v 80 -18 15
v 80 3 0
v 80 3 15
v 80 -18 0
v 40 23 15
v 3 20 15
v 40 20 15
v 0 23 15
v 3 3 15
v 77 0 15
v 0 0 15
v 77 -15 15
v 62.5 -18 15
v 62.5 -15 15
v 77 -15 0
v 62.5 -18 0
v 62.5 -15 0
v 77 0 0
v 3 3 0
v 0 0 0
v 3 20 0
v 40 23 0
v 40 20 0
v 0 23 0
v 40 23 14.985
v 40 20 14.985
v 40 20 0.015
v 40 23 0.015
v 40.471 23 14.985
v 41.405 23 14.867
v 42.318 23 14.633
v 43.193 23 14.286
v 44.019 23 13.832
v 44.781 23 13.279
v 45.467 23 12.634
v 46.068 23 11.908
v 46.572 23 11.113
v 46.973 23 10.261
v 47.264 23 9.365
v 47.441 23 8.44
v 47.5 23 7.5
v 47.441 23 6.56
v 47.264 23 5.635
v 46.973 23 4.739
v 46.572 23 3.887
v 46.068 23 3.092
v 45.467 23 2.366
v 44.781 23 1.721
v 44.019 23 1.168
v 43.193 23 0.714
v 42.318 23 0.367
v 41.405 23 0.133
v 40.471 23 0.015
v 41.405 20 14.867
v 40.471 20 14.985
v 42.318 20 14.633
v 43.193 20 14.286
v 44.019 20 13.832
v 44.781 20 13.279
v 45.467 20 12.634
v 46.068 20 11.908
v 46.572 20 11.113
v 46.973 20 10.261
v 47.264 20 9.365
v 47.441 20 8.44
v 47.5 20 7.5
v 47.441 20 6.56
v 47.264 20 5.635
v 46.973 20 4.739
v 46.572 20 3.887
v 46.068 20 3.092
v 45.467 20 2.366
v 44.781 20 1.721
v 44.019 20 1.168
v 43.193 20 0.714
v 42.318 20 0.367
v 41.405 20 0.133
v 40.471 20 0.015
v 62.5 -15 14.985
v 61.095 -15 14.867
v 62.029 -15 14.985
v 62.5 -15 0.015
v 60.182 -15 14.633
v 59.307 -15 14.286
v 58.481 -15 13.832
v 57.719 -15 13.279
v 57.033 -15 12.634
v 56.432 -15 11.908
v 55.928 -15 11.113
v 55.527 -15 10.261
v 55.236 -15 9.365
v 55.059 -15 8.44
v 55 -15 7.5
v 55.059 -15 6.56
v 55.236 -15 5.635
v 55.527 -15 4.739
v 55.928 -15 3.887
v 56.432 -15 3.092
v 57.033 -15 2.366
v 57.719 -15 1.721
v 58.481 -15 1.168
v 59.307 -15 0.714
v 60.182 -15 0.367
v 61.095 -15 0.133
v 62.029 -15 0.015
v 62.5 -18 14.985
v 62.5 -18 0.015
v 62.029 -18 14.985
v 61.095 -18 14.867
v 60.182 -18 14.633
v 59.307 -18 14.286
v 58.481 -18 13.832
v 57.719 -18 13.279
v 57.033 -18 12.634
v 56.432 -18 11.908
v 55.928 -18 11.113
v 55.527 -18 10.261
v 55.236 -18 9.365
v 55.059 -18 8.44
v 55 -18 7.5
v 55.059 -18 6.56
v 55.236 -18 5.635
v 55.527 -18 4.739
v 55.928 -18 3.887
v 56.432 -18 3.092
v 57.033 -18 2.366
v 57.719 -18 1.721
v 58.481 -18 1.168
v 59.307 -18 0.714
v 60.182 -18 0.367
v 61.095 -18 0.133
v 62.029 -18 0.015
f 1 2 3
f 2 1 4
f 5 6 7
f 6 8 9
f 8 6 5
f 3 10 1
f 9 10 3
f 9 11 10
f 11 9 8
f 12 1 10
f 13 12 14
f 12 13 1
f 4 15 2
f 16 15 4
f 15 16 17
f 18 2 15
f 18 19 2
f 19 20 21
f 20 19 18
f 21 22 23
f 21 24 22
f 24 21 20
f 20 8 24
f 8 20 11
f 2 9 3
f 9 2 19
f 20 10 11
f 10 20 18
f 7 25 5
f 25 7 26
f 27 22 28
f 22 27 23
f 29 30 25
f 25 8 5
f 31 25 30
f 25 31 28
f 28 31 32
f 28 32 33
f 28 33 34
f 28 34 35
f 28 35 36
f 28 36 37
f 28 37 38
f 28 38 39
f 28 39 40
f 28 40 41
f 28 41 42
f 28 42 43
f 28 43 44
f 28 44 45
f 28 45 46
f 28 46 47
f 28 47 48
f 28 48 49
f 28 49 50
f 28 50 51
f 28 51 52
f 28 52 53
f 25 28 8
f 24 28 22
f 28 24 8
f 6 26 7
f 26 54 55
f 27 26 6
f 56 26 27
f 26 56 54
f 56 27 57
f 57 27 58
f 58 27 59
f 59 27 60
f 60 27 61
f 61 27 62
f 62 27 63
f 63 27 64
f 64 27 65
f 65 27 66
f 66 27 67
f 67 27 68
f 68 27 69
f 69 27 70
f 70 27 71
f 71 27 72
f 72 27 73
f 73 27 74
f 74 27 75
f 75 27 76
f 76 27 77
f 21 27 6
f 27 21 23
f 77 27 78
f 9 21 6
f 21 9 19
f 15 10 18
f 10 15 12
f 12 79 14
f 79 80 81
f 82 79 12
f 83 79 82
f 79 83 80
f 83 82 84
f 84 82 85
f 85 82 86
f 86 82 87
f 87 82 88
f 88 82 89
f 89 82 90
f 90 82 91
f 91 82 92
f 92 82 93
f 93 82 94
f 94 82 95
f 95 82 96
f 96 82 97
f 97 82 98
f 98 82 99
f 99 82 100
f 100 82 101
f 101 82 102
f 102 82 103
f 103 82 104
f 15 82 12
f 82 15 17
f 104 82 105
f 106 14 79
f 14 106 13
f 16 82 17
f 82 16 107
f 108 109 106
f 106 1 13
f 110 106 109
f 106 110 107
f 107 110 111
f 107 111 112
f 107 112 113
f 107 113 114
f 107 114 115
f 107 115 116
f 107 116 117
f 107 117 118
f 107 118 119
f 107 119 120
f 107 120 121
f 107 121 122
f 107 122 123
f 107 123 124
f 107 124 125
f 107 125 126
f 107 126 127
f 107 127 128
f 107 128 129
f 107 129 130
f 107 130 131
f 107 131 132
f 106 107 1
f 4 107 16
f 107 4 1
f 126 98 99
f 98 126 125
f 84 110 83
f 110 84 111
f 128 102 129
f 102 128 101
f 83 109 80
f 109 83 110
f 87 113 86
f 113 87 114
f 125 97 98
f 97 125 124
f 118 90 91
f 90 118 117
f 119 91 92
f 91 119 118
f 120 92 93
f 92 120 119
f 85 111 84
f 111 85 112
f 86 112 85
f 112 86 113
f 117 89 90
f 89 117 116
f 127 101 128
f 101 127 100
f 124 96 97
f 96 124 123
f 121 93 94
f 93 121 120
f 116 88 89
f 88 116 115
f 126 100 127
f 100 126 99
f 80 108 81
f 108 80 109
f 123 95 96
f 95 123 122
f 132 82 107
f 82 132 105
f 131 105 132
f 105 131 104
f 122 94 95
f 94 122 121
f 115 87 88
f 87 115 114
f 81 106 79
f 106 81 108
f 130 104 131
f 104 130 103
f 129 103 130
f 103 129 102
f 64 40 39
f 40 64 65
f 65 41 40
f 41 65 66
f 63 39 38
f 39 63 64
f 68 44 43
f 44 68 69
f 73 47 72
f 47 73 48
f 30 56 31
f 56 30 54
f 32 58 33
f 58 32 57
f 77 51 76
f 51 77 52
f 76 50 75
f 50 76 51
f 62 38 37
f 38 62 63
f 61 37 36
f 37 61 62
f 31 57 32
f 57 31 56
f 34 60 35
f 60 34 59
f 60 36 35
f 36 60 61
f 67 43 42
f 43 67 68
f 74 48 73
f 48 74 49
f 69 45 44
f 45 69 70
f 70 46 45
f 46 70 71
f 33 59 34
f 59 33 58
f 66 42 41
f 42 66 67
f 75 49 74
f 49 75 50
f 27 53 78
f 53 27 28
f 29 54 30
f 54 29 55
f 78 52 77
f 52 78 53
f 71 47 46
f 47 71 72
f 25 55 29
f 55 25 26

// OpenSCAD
$fn=50;

THICKNESS=3;
WIDTH=15;
BACKDEPTH=20;
FRONTDEPTH=15;
MIDLENGTH=80;
BACKLENGTH=40;
FRONTLENGTH=25;

cube([MIDLENGTH,THICKNESS,WIDTH]);
translate([0,BACKDEPTH,0]) cube([BACKLENGTH,THICKNESS,WIDTH]);
cube([THICKNESS,BACKDEPTH,WIDTH]);
translate([MIDLENGTH-THICKNESS,-FRONTDEPTH,0]) cube([THICKNESS,FRONTDEPTH,WIDTH]);
translate([MIDLENGTH-FRONTLENGTH+(WIDTH/2),-FRONTDEPTH-THICKNESS,0]) cube([FRONTLENGTH-(WIDTH/2),THICKNESS,WIDTH]);
translate([MIDLENGTH-FRONTLENGTH+(WIDTH/2),-FRONTDEPTH,WIDTH/2]) rotate([90,0,0]) cylinder(d=WIDTH,h=THICKNESS);
translate([BACKLENGTH,BACKDEPTH+THICKNESS,WIDTH/2]) rotate([90,0,0]) cylinder(d=WIDTH,h=THICKNESS);
